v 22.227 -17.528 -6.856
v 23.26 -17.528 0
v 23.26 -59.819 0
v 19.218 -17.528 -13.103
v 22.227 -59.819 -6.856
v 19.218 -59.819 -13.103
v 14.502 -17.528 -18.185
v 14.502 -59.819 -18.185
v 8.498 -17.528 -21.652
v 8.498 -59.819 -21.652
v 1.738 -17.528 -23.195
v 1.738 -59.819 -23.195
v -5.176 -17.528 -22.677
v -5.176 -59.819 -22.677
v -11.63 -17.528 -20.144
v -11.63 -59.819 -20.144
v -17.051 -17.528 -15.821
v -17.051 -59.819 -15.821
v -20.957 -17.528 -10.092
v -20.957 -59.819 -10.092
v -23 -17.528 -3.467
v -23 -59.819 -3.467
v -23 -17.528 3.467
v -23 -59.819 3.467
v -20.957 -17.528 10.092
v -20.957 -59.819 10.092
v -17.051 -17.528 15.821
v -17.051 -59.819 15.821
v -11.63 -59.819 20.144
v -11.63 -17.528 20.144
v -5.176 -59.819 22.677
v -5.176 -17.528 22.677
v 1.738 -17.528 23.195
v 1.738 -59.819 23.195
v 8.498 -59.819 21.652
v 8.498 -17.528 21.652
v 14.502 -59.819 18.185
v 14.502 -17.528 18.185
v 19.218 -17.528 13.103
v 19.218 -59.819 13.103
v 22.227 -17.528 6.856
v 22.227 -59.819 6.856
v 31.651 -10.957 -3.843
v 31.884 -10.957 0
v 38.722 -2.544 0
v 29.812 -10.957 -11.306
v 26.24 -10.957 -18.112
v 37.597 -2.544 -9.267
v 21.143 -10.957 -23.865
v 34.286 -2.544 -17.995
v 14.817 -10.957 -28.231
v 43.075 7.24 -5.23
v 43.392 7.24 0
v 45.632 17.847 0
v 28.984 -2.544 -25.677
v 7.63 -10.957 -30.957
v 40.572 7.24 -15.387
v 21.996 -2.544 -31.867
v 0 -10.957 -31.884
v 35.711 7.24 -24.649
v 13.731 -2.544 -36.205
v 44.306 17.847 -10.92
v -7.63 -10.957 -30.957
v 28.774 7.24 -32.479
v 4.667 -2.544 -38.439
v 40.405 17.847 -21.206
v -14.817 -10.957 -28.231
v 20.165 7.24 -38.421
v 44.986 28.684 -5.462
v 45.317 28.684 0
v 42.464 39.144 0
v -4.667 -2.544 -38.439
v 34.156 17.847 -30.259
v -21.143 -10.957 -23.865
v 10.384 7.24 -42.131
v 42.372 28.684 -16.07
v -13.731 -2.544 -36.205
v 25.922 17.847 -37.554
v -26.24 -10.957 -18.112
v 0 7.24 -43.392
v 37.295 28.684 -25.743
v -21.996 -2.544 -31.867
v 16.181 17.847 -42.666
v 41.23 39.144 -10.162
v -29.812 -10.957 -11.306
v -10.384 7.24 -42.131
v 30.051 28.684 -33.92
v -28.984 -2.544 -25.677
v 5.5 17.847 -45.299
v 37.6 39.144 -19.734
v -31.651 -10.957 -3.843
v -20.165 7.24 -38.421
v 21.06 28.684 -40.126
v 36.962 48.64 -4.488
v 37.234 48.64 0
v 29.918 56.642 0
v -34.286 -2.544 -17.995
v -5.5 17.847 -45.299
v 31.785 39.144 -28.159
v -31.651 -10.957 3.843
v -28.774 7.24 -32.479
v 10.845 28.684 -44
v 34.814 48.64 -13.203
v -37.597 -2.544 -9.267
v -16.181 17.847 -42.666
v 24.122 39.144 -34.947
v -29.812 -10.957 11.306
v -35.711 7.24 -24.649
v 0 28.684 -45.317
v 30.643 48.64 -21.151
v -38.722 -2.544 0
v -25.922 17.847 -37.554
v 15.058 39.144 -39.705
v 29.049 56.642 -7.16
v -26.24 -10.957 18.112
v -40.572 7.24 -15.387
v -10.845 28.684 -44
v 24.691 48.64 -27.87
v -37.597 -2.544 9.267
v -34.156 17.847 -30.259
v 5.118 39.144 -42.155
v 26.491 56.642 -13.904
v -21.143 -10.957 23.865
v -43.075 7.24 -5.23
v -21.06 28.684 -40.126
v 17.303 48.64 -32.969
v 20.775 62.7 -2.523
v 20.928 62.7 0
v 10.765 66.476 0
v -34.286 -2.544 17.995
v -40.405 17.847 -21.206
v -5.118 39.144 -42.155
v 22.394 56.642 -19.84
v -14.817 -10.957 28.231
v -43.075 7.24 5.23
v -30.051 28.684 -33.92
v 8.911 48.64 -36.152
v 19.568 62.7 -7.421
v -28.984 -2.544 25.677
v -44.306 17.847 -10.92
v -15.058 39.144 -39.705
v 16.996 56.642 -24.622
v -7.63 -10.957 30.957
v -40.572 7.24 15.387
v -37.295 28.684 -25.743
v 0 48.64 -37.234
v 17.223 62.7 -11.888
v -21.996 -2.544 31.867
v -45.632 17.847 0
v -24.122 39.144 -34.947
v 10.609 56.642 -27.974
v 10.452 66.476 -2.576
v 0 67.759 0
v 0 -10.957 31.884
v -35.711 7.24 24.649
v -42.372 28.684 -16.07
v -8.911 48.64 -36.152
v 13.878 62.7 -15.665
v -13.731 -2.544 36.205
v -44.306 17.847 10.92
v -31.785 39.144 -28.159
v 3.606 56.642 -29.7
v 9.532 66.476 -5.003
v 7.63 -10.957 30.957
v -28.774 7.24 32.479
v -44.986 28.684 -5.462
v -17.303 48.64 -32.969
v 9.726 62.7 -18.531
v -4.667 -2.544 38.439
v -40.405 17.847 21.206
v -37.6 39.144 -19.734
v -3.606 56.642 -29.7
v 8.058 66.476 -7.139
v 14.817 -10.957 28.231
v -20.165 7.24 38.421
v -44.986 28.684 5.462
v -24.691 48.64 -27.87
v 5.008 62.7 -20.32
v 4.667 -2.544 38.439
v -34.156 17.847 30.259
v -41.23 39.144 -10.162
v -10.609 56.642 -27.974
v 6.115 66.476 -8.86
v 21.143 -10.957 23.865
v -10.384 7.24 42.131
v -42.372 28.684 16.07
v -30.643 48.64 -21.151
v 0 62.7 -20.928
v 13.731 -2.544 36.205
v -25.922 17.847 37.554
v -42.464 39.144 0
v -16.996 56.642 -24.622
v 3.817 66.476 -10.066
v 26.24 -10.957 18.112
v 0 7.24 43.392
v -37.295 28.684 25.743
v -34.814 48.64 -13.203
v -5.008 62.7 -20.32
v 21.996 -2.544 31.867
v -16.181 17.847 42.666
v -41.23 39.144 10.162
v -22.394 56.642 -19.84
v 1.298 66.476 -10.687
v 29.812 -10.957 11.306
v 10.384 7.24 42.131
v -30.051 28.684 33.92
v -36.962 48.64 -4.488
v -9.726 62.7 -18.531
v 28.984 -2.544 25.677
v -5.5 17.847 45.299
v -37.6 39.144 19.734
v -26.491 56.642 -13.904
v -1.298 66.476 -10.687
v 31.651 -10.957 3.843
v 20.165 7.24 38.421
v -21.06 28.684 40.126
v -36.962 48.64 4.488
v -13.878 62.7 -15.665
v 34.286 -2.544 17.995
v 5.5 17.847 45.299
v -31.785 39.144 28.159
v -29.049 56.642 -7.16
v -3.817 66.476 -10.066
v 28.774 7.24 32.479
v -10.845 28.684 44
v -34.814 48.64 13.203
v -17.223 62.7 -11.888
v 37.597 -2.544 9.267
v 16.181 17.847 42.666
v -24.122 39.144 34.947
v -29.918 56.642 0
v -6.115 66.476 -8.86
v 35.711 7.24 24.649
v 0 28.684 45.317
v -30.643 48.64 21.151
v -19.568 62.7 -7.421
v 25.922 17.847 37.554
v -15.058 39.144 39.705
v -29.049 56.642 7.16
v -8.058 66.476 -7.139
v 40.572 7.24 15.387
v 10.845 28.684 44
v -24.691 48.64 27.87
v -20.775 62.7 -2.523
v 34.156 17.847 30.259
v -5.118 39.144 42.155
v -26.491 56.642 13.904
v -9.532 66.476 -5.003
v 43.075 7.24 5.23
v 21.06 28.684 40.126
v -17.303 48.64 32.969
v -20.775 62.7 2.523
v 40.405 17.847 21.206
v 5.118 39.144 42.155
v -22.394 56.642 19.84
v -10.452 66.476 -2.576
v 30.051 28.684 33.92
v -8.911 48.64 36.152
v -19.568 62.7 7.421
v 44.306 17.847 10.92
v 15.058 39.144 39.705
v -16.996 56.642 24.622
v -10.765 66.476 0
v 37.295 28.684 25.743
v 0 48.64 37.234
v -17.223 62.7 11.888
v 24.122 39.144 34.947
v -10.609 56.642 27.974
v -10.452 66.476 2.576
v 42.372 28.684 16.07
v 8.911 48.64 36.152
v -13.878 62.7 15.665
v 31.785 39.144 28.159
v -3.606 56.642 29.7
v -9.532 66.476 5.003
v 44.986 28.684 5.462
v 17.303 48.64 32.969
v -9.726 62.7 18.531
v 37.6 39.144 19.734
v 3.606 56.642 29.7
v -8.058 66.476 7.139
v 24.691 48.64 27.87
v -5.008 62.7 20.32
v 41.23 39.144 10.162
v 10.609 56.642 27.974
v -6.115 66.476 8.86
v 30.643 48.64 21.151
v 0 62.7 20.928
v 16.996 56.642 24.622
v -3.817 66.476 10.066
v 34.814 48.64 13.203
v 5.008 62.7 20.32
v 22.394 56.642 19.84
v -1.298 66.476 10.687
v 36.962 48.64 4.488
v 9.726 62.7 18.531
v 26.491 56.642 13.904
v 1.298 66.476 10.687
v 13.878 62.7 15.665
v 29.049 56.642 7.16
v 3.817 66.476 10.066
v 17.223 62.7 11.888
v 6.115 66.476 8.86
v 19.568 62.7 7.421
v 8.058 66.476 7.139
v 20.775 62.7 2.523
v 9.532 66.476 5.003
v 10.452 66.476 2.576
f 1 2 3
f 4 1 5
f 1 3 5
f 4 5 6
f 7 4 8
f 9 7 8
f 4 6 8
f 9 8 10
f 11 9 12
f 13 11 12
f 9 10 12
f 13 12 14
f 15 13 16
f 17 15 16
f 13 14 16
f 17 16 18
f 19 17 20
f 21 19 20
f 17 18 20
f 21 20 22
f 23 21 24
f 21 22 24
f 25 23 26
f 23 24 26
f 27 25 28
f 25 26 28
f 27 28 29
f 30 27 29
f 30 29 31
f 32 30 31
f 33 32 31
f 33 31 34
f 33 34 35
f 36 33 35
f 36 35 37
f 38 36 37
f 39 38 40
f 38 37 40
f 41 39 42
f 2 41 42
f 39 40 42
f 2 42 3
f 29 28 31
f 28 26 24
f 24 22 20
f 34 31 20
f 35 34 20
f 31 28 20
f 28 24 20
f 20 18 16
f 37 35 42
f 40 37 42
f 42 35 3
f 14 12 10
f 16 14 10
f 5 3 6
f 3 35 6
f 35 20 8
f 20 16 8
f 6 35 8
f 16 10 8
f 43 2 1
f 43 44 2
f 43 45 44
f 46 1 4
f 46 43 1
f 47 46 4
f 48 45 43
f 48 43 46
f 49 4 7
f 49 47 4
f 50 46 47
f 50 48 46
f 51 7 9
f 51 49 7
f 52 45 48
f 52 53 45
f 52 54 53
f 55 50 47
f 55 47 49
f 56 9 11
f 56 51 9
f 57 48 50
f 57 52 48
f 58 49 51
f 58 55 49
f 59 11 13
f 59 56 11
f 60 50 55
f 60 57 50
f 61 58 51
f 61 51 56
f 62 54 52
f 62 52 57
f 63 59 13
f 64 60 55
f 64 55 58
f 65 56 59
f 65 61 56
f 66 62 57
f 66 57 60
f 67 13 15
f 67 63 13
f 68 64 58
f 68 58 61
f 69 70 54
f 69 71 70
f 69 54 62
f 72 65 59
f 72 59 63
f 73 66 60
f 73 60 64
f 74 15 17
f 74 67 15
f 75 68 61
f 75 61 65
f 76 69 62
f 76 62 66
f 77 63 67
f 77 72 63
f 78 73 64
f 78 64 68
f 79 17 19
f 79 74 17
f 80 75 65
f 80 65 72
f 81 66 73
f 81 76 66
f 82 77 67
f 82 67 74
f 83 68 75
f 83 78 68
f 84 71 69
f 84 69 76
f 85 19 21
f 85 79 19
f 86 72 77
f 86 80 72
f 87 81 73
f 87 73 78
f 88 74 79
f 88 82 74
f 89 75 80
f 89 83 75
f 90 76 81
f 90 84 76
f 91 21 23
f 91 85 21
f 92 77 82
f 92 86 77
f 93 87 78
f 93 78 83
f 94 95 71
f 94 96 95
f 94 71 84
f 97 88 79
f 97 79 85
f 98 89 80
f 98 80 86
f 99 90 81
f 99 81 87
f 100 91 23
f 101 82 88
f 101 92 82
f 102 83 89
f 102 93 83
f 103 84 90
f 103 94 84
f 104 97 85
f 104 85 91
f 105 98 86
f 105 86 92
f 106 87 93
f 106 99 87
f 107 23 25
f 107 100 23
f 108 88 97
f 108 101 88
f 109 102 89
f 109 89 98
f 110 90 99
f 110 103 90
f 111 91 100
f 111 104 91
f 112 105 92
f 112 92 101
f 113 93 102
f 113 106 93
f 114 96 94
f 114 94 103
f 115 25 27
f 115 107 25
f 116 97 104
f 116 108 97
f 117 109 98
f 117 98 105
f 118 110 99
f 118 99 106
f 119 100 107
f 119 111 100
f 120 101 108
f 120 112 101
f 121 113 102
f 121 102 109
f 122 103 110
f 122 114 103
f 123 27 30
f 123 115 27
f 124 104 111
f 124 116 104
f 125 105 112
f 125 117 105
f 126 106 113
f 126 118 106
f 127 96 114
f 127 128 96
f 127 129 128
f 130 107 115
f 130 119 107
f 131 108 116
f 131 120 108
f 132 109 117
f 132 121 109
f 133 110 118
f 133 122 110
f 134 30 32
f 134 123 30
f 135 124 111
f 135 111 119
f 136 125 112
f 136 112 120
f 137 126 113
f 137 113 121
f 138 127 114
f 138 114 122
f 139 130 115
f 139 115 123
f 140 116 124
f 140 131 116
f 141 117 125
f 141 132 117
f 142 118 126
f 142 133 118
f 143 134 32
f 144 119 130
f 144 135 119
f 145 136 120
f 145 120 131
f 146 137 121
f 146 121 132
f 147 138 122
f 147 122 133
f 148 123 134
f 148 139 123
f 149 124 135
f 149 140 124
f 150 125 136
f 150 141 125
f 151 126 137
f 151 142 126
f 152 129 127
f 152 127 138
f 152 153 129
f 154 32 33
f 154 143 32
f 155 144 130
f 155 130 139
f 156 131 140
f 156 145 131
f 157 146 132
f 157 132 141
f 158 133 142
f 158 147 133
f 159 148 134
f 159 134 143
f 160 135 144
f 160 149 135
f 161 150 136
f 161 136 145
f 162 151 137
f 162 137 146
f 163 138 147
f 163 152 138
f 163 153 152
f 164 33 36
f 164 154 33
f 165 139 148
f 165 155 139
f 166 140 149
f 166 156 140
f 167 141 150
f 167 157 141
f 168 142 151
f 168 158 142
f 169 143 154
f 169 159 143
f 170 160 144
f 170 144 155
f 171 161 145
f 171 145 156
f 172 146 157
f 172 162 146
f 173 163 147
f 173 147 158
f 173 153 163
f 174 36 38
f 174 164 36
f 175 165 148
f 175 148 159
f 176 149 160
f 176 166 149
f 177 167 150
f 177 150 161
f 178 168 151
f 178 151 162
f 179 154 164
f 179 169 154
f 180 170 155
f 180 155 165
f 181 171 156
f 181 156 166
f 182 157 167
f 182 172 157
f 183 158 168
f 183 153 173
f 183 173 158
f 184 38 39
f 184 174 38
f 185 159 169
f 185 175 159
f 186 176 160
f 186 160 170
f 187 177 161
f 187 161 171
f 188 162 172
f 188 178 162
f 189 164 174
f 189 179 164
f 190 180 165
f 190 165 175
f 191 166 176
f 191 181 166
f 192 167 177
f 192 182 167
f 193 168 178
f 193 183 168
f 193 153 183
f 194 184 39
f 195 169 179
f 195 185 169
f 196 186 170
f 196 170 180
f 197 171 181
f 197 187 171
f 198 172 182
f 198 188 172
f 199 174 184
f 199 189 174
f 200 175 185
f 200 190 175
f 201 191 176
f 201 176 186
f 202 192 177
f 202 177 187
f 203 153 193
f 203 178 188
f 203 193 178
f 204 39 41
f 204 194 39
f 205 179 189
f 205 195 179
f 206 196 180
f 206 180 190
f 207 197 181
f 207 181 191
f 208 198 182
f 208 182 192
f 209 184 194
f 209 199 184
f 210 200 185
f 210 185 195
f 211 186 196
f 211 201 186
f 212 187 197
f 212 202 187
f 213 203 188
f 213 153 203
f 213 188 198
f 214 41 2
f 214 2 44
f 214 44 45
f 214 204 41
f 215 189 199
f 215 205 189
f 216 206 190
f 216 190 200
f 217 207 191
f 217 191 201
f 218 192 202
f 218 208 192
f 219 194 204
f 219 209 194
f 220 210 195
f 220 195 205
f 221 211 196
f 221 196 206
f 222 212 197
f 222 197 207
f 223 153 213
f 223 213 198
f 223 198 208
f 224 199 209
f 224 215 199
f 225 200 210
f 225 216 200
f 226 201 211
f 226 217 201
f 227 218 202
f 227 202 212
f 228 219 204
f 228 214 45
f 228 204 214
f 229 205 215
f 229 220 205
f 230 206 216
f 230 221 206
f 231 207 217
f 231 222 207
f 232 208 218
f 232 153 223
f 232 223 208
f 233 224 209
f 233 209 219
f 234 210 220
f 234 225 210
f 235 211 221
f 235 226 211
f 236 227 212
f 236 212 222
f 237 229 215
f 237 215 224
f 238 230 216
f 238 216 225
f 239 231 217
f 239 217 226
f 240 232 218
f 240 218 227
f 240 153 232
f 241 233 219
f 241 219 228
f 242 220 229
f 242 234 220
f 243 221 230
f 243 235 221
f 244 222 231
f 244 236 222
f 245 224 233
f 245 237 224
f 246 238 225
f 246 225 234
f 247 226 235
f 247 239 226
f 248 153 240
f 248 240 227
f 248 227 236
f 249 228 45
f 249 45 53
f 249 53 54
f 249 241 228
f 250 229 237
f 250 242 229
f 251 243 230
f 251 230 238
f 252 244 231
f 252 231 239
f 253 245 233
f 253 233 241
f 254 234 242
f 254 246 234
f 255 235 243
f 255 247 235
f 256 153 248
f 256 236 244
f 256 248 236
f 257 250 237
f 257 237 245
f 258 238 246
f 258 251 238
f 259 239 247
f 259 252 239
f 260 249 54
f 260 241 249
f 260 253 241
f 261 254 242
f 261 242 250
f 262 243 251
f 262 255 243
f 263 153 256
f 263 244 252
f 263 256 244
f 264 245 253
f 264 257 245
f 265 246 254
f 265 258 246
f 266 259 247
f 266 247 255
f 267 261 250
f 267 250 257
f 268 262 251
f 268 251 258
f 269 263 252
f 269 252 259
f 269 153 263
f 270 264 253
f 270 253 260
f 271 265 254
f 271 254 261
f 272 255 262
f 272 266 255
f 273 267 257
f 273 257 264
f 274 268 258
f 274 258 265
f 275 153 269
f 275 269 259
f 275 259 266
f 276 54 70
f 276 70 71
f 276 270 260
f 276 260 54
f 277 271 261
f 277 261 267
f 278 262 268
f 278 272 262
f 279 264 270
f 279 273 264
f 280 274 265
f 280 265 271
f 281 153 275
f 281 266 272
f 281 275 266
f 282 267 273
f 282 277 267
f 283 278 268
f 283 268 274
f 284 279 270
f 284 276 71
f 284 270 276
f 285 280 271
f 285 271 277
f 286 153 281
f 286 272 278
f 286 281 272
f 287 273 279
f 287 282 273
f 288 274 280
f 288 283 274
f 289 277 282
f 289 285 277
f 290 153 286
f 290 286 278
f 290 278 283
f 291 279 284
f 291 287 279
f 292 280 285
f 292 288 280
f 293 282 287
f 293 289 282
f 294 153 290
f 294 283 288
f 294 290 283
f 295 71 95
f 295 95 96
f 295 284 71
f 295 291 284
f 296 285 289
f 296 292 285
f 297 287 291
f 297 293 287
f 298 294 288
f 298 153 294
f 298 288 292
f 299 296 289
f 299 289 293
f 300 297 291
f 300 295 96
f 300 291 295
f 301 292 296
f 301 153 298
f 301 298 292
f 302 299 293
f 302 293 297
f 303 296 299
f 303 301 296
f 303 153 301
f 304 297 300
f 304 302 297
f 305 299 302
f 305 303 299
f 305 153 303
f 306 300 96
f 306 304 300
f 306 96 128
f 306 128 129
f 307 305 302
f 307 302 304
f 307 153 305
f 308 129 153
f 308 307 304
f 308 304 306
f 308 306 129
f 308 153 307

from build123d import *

# Parameters (mm, degrees)
SKETCH1_R          = 4.191
BASE_EXTRUDE_DEPTH = 7.62
SCALE1_SCALE       = 5.55


with BuildPart() as part:
    # Sketch1 → Base-Extrude (new body)
    with BuildSketch(Plane(origin=(0, 0, 0), x_dir=(1, 0, 0), z_dir=(0, 1, 0))):
        Circle(SKETCH1_R)
    extrude(amount=BASE_EXTRUDE_DEPTH)

    # Sketch2 → Boss-Revolve1 (revolve)
    with BuildSketch(Plane.XY):
        with BuildLine():
            Line((0, 22.987), (0, 6.477))
            ThreePointArc((0, 6.477), (8.255, 14.732), (0, 22.987))
        make_face()
    revolve(axis=Axis((0, 0, 0), (0, 1, 0)))


with BuildPart() as part_1:
    # Scale1: scaled about (0, 13.146971179, 0)
    add(part.part.scale(SCALE1_SCALE).moved(Location((0, -59.818718864, 0))))


solid = part_1.part
